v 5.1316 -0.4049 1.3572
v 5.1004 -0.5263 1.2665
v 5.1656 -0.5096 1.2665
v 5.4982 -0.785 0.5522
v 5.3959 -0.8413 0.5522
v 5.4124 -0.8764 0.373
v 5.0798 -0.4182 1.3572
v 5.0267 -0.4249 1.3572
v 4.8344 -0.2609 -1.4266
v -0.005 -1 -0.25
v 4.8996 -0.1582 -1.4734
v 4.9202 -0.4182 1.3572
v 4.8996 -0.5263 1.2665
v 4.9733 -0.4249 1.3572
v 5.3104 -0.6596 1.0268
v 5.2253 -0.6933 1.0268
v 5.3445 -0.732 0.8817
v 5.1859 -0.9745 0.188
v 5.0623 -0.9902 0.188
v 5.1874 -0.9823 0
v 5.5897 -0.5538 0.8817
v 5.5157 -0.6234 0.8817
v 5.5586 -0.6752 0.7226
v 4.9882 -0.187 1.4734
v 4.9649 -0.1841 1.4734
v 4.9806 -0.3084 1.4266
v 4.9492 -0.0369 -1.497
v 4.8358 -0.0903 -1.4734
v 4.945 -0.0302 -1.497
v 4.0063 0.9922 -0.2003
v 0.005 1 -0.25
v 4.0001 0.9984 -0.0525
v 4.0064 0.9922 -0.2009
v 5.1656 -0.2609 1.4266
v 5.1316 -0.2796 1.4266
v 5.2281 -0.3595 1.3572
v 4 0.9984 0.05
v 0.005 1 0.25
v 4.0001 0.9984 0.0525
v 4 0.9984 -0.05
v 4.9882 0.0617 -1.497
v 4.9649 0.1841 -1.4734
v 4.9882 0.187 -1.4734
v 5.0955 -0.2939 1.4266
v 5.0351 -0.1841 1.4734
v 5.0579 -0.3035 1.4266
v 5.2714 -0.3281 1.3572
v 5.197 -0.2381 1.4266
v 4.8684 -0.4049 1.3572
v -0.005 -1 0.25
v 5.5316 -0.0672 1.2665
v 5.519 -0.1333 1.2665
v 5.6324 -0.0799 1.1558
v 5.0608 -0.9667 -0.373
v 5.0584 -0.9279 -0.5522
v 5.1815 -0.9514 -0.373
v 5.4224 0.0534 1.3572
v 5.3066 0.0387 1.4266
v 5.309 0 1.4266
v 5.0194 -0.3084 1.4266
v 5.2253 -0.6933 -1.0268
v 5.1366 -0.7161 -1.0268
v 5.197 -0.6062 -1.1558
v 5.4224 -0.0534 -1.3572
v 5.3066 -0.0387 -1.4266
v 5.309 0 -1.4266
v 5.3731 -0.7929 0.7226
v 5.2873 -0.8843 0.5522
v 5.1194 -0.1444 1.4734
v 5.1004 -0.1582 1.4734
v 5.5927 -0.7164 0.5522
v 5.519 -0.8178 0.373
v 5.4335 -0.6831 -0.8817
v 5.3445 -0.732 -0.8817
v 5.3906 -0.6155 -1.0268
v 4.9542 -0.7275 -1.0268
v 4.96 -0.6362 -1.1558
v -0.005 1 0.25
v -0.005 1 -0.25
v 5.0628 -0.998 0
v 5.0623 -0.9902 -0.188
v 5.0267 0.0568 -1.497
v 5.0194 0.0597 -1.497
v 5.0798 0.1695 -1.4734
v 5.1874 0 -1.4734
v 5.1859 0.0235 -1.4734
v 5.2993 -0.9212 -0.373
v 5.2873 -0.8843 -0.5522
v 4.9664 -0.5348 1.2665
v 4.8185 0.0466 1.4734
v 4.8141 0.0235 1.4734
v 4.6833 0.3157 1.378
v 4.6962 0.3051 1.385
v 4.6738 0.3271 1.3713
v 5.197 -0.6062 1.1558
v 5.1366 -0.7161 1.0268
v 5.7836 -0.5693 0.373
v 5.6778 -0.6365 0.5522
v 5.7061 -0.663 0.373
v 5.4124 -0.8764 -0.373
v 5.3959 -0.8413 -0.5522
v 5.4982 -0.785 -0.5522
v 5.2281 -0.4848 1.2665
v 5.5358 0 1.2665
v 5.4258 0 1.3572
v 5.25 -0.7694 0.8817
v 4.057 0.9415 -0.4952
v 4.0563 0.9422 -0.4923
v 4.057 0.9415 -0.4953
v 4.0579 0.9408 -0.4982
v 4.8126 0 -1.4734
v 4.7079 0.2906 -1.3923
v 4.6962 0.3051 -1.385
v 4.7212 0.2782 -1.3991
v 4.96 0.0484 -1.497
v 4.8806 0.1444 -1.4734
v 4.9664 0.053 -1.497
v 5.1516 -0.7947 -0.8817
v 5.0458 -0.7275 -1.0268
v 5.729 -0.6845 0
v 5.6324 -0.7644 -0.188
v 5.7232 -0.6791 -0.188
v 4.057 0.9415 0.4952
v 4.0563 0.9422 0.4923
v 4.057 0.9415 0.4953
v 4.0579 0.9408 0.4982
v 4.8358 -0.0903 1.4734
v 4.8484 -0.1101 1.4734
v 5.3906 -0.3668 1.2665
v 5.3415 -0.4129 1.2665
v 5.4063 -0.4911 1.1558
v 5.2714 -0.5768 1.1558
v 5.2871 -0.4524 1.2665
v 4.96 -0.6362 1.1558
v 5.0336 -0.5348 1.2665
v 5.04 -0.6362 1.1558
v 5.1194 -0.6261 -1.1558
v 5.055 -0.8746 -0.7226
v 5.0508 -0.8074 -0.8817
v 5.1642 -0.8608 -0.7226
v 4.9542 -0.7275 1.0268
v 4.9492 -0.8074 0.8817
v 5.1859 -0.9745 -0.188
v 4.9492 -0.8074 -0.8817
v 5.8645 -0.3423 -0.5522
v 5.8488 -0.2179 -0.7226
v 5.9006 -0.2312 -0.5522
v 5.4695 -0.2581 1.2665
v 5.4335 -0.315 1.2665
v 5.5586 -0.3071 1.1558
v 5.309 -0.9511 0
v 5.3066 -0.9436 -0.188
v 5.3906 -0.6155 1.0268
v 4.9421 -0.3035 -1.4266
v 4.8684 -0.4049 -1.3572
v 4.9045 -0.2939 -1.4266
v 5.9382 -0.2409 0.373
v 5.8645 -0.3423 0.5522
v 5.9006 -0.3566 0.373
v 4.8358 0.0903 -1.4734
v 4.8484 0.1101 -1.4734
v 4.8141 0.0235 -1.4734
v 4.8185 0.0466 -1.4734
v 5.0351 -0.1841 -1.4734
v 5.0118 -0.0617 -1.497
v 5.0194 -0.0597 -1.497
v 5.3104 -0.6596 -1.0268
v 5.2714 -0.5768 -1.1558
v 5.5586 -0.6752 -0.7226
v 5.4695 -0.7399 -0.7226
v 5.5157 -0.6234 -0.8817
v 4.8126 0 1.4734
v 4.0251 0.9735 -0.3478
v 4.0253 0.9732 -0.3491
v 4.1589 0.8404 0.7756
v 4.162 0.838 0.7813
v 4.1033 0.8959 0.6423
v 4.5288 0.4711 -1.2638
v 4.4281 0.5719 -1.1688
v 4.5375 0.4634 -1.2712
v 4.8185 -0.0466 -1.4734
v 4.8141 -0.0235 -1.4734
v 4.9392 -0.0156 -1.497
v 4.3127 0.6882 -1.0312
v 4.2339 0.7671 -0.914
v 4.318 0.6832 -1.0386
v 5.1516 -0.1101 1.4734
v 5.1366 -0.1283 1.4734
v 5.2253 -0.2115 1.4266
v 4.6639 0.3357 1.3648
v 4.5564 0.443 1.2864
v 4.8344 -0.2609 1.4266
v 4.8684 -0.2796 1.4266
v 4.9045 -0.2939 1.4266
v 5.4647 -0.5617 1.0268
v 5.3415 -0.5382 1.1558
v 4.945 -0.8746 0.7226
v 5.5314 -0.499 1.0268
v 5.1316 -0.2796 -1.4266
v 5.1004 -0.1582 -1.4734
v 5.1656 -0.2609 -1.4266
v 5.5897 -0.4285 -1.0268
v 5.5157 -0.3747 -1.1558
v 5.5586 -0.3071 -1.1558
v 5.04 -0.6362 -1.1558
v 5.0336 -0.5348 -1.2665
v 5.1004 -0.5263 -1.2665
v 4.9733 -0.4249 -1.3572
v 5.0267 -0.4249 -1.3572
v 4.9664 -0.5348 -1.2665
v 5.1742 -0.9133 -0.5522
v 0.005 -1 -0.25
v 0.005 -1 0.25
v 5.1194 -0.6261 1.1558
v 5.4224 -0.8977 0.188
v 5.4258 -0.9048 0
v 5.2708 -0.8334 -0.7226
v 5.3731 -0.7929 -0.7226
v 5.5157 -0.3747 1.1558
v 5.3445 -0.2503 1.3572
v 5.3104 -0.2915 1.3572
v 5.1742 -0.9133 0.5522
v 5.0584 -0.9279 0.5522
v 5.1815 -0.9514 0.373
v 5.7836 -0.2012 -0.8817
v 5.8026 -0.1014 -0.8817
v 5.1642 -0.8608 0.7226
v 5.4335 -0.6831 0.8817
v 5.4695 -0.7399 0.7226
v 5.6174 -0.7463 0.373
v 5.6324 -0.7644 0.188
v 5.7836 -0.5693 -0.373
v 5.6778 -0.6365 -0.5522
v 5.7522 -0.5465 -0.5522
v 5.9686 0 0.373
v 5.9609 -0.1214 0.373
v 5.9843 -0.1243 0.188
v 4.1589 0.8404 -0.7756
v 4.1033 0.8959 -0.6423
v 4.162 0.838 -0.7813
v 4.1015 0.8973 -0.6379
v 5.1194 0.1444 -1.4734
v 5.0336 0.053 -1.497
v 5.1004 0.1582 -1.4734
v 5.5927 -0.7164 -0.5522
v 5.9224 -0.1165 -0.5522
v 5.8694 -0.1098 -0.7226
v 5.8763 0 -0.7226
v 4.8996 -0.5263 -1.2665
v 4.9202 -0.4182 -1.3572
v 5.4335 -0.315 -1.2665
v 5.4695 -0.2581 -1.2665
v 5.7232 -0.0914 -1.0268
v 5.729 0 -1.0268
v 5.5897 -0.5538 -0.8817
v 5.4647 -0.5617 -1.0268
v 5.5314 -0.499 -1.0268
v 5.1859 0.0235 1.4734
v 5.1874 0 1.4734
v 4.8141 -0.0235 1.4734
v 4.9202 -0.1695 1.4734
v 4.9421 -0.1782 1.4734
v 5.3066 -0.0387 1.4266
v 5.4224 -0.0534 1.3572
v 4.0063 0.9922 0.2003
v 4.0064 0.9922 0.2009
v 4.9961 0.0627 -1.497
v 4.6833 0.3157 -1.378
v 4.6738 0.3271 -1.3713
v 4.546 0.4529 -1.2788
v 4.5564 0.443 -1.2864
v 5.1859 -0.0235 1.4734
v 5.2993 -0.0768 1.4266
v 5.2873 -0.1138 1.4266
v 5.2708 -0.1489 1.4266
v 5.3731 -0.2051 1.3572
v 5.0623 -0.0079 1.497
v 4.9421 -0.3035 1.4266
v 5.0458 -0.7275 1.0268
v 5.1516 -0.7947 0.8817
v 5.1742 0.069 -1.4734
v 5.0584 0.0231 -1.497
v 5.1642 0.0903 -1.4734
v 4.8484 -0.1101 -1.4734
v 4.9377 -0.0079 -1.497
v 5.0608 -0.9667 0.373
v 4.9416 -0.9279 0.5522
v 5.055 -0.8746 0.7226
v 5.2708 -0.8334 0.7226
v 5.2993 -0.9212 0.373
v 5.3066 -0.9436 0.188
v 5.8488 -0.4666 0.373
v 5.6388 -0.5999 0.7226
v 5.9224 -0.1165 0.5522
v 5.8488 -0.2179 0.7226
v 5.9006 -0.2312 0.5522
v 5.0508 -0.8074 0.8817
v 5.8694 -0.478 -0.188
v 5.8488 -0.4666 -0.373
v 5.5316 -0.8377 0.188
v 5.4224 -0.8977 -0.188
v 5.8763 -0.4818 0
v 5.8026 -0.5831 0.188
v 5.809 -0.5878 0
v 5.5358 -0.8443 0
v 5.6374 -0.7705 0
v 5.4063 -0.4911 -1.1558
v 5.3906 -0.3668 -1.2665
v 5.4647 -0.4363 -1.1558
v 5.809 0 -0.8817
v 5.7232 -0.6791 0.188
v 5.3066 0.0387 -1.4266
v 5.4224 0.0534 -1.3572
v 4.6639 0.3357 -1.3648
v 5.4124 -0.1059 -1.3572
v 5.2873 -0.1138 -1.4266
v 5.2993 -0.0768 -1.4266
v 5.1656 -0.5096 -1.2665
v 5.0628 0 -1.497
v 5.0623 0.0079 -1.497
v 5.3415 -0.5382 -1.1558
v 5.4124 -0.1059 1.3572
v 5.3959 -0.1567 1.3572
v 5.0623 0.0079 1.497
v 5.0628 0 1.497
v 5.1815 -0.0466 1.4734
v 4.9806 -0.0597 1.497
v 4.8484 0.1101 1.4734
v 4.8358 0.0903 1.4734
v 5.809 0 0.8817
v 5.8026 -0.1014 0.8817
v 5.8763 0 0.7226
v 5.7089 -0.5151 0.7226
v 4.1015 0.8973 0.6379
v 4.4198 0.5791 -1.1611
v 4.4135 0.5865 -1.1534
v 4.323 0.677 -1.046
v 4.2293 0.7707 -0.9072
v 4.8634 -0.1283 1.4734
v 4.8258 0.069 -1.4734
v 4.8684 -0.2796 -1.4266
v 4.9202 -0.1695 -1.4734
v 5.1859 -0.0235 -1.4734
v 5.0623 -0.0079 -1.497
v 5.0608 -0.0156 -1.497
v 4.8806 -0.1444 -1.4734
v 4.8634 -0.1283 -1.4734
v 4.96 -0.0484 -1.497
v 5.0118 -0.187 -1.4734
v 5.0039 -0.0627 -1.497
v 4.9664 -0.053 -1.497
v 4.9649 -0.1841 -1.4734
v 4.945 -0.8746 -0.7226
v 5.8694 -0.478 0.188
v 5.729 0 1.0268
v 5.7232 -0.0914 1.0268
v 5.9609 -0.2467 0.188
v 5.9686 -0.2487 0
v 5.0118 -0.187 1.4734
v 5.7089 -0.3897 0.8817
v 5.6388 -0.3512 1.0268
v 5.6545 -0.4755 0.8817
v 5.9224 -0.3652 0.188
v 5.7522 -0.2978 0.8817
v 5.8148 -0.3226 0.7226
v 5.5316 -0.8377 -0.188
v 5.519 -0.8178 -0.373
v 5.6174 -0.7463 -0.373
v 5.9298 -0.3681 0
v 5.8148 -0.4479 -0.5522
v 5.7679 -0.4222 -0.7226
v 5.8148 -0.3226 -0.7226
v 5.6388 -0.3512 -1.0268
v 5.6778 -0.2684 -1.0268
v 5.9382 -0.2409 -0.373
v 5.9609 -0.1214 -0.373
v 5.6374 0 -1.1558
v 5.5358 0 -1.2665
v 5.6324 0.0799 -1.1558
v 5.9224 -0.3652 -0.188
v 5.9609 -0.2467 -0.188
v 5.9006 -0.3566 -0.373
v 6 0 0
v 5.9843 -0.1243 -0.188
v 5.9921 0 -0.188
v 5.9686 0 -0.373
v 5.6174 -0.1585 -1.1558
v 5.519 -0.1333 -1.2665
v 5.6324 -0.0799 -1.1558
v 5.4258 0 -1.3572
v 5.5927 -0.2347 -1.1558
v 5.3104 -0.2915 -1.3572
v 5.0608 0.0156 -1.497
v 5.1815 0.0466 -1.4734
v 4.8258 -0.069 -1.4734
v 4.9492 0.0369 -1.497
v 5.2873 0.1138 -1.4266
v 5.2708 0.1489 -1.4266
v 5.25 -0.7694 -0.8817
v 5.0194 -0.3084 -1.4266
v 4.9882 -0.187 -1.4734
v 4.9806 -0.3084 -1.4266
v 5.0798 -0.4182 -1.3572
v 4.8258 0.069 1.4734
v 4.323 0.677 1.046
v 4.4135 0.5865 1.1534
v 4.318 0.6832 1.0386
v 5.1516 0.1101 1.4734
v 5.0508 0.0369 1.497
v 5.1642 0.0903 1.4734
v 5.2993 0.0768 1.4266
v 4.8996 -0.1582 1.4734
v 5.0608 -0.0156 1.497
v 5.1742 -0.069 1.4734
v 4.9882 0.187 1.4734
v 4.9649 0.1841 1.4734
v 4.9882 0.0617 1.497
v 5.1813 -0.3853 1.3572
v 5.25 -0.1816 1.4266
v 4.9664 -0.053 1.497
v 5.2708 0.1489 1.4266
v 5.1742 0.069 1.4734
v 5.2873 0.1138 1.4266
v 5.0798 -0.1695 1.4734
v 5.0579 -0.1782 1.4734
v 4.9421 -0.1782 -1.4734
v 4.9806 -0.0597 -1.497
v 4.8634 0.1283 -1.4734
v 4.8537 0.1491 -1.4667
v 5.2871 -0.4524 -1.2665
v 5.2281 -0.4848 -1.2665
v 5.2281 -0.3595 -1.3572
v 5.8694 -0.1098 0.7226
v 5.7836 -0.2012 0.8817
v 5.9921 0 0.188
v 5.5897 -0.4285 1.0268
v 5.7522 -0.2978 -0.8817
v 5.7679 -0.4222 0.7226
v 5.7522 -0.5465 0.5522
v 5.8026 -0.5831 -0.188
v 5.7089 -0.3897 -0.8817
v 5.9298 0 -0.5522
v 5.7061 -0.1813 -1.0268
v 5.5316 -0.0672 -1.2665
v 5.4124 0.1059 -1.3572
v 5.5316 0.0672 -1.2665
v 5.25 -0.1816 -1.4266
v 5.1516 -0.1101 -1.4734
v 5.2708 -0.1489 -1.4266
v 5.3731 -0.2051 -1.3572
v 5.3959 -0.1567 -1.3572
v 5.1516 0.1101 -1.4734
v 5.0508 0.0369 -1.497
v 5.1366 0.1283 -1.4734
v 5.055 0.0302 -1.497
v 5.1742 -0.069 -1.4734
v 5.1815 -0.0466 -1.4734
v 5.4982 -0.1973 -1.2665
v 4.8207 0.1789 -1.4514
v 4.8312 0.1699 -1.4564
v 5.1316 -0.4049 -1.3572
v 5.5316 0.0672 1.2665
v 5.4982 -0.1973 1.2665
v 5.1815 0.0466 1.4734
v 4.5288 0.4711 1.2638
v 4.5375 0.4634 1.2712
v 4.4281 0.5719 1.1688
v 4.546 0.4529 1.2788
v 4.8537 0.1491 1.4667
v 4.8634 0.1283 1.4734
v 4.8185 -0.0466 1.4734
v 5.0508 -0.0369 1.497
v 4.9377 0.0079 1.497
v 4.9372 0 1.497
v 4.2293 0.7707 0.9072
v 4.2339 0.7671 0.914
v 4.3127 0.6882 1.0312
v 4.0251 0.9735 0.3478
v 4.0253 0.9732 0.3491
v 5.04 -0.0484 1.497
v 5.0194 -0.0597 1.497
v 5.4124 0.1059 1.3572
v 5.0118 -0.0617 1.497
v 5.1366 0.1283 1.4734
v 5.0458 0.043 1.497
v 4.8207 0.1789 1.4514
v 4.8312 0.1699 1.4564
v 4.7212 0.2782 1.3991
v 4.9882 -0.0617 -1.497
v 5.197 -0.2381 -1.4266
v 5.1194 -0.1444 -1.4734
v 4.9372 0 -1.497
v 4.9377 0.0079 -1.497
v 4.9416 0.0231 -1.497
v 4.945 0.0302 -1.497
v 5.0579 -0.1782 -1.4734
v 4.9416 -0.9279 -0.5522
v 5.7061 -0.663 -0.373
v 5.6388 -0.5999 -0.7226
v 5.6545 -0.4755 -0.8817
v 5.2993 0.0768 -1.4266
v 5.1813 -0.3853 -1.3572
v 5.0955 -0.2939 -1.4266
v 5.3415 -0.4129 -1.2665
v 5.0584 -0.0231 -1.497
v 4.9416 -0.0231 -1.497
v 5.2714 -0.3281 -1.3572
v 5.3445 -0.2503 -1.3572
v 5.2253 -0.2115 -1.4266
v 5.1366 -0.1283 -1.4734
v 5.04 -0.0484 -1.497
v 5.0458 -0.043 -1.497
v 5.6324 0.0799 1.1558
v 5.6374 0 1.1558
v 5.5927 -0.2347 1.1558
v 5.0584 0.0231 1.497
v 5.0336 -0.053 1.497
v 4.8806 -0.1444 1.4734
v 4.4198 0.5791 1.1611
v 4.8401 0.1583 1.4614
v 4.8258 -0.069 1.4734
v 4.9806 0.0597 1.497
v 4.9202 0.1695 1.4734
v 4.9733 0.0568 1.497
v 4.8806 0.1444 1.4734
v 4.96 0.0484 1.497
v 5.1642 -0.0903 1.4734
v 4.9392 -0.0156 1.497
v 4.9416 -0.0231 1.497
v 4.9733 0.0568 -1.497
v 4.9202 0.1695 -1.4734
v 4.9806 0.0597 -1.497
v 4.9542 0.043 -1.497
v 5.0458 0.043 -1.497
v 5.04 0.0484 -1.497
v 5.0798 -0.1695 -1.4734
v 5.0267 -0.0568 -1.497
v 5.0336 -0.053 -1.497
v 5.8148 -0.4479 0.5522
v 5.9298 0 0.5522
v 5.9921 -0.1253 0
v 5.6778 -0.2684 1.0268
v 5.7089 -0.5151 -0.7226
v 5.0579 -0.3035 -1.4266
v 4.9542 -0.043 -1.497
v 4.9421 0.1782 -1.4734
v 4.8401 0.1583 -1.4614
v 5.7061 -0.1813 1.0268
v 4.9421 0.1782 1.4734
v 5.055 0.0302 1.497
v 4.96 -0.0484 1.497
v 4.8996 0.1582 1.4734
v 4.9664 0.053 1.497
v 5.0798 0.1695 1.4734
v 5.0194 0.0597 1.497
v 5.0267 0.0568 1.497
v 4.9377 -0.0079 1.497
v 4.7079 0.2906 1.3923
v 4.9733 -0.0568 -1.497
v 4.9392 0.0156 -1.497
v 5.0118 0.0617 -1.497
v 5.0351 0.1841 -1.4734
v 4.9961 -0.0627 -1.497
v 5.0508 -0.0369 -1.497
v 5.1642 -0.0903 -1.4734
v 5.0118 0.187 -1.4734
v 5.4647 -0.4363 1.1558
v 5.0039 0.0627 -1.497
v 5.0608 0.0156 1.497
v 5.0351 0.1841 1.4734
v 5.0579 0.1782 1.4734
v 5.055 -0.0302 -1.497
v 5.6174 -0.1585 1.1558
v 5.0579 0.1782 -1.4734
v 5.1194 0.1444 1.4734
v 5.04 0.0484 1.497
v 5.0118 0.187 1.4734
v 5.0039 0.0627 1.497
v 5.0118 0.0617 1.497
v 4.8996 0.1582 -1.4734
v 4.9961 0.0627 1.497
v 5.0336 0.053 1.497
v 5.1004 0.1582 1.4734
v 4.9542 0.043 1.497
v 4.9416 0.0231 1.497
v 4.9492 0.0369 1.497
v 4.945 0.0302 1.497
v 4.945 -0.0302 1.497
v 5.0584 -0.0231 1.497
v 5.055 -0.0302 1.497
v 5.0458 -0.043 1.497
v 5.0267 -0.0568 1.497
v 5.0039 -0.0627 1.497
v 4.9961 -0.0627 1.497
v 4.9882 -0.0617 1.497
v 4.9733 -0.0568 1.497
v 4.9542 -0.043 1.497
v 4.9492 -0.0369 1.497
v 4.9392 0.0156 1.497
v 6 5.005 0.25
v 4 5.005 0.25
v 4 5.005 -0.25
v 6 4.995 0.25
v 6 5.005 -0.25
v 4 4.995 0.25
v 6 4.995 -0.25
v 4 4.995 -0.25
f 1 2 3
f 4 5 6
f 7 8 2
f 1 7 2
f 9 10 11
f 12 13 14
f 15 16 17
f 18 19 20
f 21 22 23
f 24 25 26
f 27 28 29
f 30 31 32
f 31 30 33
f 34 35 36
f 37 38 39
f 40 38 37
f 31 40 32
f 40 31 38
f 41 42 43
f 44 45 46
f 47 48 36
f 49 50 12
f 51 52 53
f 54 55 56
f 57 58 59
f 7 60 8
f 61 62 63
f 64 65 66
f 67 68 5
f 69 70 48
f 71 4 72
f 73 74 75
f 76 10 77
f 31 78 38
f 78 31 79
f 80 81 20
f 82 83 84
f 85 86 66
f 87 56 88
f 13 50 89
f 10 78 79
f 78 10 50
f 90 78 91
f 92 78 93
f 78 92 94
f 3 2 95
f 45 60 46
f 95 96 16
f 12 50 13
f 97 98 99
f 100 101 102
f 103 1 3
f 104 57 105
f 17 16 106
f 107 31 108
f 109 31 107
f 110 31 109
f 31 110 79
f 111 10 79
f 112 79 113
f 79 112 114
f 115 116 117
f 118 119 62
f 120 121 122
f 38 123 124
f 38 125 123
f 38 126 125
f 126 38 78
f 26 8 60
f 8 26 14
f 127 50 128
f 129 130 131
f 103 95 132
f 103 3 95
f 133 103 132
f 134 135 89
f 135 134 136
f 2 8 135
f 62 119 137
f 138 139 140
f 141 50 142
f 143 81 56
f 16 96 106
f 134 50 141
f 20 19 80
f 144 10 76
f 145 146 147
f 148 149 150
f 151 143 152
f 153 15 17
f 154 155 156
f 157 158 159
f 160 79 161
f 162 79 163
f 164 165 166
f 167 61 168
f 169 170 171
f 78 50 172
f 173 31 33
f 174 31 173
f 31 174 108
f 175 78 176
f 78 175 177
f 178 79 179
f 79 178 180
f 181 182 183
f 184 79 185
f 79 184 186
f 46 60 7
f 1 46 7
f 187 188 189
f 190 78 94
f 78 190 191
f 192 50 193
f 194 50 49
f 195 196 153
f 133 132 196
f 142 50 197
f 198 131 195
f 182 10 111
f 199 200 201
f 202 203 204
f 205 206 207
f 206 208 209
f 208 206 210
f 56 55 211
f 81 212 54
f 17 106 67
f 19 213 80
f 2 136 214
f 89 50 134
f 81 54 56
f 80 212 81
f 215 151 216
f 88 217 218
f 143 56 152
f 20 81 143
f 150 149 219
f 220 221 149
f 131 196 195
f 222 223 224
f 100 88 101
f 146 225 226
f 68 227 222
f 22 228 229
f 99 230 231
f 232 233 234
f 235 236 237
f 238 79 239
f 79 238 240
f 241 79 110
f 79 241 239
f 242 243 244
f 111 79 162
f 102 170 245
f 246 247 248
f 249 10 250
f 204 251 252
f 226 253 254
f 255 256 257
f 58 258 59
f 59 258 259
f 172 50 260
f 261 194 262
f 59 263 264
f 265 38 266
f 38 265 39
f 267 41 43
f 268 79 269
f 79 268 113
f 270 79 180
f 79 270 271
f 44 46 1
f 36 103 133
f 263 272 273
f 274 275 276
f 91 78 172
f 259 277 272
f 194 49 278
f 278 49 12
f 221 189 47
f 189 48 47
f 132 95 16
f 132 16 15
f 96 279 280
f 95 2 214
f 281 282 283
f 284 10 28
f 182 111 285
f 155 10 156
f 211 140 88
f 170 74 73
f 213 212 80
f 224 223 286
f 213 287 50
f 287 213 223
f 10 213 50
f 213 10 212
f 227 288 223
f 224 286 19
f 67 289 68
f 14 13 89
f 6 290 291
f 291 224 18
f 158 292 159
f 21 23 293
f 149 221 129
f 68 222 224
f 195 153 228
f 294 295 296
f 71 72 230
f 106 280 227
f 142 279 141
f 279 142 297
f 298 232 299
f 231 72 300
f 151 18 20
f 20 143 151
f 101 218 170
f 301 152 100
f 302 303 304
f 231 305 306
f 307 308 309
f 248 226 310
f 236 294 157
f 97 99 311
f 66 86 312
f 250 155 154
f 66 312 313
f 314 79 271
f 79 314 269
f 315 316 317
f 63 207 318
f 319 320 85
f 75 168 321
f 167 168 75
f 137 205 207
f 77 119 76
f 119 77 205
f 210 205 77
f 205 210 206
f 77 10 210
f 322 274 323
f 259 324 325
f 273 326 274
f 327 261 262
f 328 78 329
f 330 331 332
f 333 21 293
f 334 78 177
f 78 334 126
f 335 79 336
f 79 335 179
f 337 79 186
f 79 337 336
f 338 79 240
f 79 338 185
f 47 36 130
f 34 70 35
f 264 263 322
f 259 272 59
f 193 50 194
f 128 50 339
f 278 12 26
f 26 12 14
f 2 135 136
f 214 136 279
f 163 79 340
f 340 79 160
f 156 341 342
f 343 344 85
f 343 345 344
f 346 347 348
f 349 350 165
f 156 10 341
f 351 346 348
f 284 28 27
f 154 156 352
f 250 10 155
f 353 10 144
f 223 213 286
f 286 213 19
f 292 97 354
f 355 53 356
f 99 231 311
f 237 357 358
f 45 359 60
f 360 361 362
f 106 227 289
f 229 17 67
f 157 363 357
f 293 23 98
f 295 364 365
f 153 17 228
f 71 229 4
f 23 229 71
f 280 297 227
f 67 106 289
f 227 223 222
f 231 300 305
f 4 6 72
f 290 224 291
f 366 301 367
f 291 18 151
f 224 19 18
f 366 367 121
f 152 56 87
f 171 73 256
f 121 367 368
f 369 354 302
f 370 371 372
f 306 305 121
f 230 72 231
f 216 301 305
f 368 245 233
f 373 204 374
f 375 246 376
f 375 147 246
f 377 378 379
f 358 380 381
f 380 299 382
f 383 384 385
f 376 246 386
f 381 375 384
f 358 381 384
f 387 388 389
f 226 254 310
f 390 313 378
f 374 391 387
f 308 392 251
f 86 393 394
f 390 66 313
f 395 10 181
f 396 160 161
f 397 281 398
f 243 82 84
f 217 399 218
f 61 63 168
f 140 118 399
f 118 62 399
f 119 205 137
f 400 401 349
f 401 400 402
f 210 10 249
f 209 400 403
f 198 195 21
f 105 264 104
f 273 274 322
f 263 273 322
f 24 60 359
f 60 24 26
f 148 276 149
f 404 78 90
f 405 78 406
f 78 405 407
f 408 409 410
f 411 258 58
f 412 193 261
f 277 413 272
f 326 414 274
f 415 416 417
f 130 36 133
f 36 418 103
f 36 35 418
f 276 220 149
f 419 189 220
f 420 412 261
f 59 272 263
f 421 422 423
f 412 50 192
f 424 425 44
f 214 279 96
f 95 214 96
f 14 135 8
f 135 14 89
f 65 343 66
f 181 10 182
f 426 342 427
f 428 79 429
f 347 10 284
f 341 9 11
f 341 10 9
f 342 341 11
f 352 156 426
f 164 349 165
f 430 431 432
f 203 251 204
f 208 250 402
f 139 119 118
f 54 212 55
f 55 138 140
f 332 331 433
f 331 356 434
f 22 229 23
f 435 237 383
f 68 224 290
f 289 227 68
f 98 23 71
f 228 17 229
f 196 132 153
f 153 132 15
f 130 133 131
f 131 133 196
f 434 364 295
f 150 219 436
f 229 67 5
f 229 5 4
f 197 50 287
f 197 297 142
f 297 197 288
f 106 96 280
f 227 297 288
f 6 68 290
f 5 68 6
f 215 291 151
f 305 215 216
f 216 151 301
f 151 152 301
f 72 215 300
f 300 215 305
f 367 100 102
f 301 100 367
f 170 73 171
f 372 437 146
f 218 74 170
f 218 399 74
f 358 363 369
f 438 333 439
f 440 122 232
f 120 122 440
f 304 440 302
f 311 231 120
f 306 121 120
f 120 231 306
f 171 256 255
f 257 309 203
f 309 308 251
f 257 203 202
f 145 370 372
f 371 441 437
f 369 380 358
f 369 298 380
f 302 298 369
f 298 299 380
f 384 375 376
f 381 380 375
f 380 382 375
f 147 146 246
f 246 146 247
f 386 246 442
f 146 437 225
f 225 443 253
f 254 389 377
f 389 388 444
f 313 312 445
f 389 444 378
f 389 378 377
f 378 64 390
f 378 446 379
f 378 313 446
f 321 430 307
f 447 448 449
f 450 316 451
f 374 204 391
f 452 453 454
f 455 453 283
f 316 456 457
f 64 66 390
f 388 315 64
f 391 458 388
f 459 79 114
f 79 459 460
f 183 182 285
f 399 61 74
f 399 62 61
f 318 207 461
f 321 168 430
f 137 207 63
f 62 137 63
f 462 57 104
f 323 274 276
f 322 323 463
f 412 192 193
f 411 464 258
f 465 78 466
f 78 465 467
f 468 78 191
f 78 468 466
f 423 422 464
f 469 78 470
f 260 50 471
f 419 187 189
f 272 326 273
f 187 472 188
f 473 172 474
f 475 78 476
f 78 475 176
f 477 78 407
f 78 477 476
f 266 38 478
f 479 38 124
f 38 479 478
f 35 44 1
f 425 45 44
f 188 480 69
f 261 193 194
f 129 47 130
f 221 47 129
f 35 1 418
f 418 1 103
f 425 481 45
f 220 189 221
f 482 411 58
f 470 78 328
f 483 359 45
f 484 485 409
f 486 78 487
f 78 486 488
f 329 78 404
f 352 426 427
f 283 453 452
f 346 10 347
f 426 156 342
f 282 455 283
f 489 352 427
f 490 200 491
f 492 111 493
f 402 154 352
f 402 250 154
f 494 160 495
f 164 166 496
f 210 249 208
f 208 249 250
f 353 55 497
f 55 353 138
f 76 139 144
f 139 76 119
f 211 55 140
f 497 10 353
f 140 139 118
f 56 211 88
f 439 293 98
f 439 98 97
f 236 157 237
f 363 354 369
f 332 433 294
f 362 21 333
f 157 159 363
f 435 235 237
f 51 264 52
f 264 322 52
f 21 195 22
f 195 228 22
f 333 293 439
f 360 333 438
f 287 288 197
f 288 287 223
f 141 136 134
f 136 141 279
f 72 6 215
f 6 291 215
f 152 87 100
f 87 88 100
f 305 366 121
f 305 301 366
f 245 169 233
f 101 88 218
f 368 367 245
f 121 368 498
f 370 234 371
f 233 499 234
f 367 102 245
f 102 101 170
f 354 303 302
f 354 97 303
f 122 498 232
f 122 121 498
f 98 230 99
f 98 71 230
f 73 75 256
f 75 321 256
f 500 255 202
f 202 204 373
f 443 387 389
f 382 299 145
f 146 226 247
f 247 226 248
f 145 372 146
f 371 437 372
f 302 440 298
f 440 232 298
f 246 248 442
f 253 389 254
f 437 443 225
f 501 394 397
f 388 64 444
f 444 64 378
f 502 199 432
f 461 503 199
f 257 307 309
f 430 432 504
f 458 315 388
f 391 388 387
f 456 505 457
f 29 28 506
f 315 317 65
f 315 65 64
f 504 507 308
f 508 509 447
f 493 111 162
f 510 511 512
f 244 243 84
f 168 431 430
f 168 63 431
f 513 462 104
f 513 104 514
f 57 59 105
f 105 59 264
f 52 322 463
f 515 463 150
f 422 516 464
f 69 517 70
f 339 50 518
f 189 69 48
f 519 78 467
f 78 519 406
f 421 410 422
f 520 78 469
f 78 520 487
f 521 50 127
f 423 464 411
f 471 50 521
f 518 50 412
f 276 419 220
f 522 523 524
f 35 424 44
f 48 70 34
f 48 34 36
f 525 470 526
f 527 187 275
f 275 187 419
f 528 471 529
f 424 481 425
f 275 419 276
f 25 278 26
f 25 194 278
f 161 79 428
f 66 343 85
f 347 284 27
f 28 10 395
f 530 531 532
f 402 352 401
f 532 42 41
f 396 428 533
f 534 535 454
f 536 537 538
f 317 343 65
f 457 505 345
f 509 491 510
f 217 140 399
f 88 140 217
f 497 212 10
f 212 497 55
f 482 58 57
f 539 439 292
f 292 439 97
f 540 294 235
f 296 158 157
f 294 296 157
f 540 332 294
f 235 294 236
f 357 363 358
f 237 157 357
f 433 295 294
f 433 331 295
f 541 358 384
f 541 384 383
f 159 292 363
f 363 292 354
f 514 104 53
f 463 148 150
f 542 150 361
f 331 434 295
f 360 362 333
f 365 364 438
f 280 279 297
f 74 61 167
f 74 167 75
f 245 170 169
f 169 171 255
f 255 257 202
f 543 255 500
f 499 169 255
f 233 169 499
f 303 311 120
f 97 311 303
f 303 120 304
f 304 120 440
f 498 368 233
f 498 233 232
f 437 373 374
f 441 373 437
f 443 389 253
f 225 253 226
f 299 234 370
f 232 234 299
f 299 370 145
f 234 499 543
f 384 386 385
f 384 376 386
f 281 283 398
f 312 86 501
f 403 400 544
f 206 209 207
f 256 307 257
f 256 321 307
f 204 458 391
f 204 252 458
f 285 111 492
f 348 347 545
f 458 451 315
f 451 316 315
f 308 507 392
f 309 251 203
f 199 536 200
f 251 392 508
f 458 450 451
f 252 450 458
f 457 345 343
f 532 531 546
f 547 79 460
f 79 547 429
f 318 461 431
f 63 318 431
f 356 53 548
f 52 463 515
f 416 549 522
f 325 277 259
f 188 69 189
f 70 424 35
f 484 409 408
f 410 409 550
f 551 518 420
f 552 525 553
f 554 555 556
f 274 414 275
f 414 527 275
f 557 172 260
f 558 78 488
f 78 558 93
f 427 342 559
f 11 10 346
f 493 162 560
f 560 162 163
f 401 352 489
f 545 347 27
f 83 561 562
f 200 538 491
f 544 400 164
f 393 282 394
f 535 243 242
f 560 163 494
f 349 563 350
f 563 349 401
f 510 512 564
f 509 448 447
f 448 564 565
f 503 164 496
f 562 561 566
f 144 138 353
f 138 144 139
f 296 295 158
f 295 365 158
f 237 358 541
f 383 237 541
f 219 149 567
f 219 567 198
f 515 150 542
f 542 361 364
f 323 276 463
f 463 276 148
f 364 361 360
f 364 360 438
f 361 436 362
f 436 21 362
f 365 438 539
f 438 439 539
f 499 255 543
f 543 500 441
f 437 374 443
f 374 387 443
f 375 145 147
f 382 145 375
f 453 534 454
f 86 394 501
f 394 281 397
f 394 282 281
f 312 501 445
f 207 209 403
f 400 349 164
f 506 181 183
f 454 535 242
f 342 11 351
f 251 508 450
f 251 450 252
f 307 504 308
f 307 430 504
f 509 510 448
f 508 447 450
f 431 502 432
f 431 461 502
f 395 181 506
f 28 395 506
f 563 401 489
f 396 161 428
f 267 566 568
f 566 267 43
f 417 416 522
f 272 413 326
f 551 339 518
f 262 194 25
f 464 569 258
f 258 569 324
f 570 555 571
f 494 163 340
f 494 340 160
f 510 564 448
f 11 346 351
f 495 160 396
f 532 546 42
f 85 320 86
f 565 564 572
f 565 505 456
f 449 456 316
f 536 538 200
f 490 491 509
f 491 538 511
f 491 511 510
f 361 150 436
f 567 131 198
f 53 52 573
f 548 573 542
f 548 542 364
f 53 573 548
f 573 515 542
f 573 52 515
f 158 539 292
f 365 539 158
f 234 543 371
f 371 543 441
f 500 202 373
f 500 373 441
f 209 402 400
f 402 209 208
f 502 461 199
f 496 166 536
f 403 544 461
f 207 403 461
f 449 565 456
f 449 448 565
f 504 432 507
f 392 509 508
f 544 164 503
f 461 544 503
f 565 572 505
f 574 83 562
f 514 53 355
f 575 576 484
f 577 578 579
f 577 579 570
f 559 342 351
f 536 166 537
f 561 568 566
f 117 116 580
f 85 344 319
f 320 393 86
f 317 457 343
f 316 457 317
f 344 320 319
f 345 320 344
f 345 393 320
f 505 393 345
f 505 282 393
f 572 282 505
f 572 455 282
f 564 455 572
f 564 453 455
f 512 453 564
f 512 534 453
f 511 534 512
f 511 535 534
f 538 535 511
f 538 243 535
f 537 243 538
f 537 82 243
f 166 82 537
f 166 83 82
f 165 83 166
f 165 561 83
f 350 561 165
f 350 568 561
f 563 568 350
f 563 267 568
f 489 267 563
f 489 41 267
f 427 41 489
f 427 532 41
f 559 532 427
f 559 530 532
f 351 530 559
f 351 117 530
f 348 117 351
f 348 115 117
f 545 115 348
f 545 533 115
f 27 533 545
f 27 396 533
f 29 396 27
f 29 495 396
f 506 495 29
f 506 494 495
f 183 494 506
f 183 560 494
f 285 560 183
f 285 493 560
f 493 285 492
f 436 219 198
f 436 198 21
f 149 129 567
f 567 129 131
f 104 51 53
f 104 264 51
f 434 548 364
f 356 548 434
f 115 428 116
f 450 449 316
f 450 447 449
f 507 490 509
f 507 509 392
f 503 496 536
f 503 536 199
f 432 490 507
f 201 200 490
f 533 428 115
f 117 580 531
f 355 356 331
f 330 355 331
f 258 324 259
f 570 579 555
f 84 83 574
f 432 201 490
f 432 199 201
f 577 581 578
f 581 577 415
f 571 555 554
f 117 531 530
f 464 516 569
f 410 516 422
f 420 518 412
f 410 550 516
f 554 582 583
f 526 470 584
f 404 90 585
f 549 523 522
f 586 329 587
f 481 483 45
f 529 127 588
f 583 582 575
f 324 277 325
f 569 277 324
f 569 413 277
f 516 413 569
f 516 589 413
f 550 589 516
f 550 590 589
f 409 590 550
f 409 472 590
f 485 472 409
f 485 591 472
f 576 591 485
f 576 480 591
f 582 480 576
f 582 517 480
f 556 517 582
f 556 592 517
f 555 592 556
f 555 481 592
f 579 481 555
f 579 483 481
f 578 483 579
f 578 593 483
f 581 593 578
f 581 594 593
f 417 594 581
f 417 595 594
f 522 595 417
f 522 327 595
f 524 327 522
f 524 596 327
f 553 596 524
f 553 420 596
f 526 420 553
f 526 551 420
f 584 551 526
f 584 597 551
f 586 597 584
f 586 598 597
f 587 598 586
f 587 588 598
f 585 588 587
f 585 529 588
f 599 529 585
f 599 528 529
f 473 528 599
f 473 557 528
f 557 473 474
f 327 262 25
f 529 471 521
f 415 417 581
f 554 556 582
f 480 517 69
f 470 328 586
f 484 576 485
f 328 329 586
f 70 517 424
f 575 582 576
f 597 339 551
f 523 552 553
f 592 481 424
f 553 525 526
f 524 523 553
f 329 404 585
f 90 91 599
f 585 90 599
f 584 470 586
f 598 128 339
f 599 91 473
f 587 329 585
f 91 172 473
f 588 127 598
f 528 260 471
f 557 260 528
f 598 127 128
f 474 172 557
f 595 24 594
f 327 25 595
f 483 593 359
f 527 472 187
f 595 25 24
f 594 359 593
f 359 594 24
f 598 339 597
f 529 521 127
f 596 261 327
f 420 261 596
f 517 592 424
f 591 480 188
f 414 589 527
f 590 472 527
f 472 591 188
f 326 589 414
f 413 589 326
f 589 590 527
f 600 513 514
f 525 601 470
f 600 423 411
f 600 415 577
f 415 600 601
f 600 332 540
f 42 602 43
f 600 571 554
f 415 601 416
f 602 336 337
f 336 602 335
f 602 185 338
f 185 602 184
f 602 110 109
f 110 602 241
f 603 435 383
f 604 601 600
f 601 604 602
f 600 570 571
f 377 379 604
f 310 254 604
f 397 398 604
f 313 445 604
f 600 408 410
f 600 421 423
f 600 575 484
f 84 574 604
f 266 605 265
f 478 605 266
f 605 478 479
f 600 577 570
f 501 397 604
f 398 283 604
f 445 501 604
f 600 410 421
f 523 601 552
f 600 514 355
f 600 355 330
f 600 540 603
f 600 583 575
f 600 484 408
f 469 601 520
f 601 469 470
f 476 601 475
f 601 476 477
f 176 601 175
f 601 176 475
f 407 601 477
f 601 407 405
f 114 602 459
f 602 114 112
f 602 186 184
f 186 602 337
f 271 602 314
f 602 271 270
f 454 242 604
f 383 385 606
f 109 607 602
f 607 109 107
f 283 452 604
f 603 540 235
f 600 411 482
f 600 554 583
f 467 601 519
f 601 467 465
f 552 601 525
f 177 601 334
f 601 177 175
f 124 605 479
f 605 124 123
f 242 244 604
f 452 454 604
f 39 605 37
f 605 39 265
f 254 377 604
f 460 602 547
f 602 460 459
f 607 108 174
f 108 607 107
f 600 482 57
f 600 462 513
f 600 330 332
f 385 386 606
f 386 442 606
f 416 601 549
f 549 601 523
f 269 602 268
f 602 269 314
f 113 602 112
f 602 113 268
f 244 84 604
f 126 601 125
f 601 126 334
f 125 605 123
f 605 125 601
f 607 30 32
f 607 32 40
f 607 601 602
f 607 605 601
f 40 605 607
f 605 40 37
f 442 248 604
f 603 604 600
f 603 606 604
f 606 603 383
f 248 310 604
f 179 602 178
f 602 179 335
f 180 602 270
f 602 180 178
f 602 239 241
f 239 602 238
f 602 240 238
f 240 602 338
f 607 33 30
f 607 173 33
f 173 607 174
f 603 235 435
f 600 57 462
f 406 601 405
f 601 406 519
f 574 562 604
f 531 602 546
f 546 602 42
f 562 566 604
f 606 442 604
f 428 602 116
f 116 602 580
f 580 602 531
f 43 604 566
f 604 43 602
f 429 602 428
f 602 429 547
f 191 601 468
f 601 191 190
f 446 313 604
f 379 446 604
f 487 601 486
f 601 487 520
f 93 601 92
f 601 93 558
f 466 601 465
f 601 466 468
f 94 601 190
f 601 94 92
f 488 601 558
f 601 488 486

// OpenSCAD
use <../polychannel.scad>

function cube_shape(size, position, ang=[0, [0,0,1]]) = [
    "cube", size, position, ang
];
function sphere_shape(size, position, ang=[0, [0,0,1]]) = [
    "sphr", size, position, ang
];

// Shortcuts
function cs(size, position, ang=[0, [0,0,1]]) = cube_shape(size, position, ang);
function ss(size, position, ang=[0, [0,0,1]]) = sphere_shape(size, position, ang);

cube_size = [0.01, 2, 0.5];
sphere_size = [2, 2, 3];

echo();
echo(cube_shape(cube_size, [1, 0, 0]));
echo(cs(cube_size, [1, 0, 0]));
echo();
echo(sphere_shape(sphere_size, [1, 0, 0]));
echo(ss(sphere_size, [1, 0, 0]));
echo();

polychannel(
    [
        cs(cube_size, [0, 0, 0]),
        ss(sphere_size, [5, 0, 0]),
        cs(cube_size, [0, 5, 0], [90, [0, 0, 1]]),
    ]
);
